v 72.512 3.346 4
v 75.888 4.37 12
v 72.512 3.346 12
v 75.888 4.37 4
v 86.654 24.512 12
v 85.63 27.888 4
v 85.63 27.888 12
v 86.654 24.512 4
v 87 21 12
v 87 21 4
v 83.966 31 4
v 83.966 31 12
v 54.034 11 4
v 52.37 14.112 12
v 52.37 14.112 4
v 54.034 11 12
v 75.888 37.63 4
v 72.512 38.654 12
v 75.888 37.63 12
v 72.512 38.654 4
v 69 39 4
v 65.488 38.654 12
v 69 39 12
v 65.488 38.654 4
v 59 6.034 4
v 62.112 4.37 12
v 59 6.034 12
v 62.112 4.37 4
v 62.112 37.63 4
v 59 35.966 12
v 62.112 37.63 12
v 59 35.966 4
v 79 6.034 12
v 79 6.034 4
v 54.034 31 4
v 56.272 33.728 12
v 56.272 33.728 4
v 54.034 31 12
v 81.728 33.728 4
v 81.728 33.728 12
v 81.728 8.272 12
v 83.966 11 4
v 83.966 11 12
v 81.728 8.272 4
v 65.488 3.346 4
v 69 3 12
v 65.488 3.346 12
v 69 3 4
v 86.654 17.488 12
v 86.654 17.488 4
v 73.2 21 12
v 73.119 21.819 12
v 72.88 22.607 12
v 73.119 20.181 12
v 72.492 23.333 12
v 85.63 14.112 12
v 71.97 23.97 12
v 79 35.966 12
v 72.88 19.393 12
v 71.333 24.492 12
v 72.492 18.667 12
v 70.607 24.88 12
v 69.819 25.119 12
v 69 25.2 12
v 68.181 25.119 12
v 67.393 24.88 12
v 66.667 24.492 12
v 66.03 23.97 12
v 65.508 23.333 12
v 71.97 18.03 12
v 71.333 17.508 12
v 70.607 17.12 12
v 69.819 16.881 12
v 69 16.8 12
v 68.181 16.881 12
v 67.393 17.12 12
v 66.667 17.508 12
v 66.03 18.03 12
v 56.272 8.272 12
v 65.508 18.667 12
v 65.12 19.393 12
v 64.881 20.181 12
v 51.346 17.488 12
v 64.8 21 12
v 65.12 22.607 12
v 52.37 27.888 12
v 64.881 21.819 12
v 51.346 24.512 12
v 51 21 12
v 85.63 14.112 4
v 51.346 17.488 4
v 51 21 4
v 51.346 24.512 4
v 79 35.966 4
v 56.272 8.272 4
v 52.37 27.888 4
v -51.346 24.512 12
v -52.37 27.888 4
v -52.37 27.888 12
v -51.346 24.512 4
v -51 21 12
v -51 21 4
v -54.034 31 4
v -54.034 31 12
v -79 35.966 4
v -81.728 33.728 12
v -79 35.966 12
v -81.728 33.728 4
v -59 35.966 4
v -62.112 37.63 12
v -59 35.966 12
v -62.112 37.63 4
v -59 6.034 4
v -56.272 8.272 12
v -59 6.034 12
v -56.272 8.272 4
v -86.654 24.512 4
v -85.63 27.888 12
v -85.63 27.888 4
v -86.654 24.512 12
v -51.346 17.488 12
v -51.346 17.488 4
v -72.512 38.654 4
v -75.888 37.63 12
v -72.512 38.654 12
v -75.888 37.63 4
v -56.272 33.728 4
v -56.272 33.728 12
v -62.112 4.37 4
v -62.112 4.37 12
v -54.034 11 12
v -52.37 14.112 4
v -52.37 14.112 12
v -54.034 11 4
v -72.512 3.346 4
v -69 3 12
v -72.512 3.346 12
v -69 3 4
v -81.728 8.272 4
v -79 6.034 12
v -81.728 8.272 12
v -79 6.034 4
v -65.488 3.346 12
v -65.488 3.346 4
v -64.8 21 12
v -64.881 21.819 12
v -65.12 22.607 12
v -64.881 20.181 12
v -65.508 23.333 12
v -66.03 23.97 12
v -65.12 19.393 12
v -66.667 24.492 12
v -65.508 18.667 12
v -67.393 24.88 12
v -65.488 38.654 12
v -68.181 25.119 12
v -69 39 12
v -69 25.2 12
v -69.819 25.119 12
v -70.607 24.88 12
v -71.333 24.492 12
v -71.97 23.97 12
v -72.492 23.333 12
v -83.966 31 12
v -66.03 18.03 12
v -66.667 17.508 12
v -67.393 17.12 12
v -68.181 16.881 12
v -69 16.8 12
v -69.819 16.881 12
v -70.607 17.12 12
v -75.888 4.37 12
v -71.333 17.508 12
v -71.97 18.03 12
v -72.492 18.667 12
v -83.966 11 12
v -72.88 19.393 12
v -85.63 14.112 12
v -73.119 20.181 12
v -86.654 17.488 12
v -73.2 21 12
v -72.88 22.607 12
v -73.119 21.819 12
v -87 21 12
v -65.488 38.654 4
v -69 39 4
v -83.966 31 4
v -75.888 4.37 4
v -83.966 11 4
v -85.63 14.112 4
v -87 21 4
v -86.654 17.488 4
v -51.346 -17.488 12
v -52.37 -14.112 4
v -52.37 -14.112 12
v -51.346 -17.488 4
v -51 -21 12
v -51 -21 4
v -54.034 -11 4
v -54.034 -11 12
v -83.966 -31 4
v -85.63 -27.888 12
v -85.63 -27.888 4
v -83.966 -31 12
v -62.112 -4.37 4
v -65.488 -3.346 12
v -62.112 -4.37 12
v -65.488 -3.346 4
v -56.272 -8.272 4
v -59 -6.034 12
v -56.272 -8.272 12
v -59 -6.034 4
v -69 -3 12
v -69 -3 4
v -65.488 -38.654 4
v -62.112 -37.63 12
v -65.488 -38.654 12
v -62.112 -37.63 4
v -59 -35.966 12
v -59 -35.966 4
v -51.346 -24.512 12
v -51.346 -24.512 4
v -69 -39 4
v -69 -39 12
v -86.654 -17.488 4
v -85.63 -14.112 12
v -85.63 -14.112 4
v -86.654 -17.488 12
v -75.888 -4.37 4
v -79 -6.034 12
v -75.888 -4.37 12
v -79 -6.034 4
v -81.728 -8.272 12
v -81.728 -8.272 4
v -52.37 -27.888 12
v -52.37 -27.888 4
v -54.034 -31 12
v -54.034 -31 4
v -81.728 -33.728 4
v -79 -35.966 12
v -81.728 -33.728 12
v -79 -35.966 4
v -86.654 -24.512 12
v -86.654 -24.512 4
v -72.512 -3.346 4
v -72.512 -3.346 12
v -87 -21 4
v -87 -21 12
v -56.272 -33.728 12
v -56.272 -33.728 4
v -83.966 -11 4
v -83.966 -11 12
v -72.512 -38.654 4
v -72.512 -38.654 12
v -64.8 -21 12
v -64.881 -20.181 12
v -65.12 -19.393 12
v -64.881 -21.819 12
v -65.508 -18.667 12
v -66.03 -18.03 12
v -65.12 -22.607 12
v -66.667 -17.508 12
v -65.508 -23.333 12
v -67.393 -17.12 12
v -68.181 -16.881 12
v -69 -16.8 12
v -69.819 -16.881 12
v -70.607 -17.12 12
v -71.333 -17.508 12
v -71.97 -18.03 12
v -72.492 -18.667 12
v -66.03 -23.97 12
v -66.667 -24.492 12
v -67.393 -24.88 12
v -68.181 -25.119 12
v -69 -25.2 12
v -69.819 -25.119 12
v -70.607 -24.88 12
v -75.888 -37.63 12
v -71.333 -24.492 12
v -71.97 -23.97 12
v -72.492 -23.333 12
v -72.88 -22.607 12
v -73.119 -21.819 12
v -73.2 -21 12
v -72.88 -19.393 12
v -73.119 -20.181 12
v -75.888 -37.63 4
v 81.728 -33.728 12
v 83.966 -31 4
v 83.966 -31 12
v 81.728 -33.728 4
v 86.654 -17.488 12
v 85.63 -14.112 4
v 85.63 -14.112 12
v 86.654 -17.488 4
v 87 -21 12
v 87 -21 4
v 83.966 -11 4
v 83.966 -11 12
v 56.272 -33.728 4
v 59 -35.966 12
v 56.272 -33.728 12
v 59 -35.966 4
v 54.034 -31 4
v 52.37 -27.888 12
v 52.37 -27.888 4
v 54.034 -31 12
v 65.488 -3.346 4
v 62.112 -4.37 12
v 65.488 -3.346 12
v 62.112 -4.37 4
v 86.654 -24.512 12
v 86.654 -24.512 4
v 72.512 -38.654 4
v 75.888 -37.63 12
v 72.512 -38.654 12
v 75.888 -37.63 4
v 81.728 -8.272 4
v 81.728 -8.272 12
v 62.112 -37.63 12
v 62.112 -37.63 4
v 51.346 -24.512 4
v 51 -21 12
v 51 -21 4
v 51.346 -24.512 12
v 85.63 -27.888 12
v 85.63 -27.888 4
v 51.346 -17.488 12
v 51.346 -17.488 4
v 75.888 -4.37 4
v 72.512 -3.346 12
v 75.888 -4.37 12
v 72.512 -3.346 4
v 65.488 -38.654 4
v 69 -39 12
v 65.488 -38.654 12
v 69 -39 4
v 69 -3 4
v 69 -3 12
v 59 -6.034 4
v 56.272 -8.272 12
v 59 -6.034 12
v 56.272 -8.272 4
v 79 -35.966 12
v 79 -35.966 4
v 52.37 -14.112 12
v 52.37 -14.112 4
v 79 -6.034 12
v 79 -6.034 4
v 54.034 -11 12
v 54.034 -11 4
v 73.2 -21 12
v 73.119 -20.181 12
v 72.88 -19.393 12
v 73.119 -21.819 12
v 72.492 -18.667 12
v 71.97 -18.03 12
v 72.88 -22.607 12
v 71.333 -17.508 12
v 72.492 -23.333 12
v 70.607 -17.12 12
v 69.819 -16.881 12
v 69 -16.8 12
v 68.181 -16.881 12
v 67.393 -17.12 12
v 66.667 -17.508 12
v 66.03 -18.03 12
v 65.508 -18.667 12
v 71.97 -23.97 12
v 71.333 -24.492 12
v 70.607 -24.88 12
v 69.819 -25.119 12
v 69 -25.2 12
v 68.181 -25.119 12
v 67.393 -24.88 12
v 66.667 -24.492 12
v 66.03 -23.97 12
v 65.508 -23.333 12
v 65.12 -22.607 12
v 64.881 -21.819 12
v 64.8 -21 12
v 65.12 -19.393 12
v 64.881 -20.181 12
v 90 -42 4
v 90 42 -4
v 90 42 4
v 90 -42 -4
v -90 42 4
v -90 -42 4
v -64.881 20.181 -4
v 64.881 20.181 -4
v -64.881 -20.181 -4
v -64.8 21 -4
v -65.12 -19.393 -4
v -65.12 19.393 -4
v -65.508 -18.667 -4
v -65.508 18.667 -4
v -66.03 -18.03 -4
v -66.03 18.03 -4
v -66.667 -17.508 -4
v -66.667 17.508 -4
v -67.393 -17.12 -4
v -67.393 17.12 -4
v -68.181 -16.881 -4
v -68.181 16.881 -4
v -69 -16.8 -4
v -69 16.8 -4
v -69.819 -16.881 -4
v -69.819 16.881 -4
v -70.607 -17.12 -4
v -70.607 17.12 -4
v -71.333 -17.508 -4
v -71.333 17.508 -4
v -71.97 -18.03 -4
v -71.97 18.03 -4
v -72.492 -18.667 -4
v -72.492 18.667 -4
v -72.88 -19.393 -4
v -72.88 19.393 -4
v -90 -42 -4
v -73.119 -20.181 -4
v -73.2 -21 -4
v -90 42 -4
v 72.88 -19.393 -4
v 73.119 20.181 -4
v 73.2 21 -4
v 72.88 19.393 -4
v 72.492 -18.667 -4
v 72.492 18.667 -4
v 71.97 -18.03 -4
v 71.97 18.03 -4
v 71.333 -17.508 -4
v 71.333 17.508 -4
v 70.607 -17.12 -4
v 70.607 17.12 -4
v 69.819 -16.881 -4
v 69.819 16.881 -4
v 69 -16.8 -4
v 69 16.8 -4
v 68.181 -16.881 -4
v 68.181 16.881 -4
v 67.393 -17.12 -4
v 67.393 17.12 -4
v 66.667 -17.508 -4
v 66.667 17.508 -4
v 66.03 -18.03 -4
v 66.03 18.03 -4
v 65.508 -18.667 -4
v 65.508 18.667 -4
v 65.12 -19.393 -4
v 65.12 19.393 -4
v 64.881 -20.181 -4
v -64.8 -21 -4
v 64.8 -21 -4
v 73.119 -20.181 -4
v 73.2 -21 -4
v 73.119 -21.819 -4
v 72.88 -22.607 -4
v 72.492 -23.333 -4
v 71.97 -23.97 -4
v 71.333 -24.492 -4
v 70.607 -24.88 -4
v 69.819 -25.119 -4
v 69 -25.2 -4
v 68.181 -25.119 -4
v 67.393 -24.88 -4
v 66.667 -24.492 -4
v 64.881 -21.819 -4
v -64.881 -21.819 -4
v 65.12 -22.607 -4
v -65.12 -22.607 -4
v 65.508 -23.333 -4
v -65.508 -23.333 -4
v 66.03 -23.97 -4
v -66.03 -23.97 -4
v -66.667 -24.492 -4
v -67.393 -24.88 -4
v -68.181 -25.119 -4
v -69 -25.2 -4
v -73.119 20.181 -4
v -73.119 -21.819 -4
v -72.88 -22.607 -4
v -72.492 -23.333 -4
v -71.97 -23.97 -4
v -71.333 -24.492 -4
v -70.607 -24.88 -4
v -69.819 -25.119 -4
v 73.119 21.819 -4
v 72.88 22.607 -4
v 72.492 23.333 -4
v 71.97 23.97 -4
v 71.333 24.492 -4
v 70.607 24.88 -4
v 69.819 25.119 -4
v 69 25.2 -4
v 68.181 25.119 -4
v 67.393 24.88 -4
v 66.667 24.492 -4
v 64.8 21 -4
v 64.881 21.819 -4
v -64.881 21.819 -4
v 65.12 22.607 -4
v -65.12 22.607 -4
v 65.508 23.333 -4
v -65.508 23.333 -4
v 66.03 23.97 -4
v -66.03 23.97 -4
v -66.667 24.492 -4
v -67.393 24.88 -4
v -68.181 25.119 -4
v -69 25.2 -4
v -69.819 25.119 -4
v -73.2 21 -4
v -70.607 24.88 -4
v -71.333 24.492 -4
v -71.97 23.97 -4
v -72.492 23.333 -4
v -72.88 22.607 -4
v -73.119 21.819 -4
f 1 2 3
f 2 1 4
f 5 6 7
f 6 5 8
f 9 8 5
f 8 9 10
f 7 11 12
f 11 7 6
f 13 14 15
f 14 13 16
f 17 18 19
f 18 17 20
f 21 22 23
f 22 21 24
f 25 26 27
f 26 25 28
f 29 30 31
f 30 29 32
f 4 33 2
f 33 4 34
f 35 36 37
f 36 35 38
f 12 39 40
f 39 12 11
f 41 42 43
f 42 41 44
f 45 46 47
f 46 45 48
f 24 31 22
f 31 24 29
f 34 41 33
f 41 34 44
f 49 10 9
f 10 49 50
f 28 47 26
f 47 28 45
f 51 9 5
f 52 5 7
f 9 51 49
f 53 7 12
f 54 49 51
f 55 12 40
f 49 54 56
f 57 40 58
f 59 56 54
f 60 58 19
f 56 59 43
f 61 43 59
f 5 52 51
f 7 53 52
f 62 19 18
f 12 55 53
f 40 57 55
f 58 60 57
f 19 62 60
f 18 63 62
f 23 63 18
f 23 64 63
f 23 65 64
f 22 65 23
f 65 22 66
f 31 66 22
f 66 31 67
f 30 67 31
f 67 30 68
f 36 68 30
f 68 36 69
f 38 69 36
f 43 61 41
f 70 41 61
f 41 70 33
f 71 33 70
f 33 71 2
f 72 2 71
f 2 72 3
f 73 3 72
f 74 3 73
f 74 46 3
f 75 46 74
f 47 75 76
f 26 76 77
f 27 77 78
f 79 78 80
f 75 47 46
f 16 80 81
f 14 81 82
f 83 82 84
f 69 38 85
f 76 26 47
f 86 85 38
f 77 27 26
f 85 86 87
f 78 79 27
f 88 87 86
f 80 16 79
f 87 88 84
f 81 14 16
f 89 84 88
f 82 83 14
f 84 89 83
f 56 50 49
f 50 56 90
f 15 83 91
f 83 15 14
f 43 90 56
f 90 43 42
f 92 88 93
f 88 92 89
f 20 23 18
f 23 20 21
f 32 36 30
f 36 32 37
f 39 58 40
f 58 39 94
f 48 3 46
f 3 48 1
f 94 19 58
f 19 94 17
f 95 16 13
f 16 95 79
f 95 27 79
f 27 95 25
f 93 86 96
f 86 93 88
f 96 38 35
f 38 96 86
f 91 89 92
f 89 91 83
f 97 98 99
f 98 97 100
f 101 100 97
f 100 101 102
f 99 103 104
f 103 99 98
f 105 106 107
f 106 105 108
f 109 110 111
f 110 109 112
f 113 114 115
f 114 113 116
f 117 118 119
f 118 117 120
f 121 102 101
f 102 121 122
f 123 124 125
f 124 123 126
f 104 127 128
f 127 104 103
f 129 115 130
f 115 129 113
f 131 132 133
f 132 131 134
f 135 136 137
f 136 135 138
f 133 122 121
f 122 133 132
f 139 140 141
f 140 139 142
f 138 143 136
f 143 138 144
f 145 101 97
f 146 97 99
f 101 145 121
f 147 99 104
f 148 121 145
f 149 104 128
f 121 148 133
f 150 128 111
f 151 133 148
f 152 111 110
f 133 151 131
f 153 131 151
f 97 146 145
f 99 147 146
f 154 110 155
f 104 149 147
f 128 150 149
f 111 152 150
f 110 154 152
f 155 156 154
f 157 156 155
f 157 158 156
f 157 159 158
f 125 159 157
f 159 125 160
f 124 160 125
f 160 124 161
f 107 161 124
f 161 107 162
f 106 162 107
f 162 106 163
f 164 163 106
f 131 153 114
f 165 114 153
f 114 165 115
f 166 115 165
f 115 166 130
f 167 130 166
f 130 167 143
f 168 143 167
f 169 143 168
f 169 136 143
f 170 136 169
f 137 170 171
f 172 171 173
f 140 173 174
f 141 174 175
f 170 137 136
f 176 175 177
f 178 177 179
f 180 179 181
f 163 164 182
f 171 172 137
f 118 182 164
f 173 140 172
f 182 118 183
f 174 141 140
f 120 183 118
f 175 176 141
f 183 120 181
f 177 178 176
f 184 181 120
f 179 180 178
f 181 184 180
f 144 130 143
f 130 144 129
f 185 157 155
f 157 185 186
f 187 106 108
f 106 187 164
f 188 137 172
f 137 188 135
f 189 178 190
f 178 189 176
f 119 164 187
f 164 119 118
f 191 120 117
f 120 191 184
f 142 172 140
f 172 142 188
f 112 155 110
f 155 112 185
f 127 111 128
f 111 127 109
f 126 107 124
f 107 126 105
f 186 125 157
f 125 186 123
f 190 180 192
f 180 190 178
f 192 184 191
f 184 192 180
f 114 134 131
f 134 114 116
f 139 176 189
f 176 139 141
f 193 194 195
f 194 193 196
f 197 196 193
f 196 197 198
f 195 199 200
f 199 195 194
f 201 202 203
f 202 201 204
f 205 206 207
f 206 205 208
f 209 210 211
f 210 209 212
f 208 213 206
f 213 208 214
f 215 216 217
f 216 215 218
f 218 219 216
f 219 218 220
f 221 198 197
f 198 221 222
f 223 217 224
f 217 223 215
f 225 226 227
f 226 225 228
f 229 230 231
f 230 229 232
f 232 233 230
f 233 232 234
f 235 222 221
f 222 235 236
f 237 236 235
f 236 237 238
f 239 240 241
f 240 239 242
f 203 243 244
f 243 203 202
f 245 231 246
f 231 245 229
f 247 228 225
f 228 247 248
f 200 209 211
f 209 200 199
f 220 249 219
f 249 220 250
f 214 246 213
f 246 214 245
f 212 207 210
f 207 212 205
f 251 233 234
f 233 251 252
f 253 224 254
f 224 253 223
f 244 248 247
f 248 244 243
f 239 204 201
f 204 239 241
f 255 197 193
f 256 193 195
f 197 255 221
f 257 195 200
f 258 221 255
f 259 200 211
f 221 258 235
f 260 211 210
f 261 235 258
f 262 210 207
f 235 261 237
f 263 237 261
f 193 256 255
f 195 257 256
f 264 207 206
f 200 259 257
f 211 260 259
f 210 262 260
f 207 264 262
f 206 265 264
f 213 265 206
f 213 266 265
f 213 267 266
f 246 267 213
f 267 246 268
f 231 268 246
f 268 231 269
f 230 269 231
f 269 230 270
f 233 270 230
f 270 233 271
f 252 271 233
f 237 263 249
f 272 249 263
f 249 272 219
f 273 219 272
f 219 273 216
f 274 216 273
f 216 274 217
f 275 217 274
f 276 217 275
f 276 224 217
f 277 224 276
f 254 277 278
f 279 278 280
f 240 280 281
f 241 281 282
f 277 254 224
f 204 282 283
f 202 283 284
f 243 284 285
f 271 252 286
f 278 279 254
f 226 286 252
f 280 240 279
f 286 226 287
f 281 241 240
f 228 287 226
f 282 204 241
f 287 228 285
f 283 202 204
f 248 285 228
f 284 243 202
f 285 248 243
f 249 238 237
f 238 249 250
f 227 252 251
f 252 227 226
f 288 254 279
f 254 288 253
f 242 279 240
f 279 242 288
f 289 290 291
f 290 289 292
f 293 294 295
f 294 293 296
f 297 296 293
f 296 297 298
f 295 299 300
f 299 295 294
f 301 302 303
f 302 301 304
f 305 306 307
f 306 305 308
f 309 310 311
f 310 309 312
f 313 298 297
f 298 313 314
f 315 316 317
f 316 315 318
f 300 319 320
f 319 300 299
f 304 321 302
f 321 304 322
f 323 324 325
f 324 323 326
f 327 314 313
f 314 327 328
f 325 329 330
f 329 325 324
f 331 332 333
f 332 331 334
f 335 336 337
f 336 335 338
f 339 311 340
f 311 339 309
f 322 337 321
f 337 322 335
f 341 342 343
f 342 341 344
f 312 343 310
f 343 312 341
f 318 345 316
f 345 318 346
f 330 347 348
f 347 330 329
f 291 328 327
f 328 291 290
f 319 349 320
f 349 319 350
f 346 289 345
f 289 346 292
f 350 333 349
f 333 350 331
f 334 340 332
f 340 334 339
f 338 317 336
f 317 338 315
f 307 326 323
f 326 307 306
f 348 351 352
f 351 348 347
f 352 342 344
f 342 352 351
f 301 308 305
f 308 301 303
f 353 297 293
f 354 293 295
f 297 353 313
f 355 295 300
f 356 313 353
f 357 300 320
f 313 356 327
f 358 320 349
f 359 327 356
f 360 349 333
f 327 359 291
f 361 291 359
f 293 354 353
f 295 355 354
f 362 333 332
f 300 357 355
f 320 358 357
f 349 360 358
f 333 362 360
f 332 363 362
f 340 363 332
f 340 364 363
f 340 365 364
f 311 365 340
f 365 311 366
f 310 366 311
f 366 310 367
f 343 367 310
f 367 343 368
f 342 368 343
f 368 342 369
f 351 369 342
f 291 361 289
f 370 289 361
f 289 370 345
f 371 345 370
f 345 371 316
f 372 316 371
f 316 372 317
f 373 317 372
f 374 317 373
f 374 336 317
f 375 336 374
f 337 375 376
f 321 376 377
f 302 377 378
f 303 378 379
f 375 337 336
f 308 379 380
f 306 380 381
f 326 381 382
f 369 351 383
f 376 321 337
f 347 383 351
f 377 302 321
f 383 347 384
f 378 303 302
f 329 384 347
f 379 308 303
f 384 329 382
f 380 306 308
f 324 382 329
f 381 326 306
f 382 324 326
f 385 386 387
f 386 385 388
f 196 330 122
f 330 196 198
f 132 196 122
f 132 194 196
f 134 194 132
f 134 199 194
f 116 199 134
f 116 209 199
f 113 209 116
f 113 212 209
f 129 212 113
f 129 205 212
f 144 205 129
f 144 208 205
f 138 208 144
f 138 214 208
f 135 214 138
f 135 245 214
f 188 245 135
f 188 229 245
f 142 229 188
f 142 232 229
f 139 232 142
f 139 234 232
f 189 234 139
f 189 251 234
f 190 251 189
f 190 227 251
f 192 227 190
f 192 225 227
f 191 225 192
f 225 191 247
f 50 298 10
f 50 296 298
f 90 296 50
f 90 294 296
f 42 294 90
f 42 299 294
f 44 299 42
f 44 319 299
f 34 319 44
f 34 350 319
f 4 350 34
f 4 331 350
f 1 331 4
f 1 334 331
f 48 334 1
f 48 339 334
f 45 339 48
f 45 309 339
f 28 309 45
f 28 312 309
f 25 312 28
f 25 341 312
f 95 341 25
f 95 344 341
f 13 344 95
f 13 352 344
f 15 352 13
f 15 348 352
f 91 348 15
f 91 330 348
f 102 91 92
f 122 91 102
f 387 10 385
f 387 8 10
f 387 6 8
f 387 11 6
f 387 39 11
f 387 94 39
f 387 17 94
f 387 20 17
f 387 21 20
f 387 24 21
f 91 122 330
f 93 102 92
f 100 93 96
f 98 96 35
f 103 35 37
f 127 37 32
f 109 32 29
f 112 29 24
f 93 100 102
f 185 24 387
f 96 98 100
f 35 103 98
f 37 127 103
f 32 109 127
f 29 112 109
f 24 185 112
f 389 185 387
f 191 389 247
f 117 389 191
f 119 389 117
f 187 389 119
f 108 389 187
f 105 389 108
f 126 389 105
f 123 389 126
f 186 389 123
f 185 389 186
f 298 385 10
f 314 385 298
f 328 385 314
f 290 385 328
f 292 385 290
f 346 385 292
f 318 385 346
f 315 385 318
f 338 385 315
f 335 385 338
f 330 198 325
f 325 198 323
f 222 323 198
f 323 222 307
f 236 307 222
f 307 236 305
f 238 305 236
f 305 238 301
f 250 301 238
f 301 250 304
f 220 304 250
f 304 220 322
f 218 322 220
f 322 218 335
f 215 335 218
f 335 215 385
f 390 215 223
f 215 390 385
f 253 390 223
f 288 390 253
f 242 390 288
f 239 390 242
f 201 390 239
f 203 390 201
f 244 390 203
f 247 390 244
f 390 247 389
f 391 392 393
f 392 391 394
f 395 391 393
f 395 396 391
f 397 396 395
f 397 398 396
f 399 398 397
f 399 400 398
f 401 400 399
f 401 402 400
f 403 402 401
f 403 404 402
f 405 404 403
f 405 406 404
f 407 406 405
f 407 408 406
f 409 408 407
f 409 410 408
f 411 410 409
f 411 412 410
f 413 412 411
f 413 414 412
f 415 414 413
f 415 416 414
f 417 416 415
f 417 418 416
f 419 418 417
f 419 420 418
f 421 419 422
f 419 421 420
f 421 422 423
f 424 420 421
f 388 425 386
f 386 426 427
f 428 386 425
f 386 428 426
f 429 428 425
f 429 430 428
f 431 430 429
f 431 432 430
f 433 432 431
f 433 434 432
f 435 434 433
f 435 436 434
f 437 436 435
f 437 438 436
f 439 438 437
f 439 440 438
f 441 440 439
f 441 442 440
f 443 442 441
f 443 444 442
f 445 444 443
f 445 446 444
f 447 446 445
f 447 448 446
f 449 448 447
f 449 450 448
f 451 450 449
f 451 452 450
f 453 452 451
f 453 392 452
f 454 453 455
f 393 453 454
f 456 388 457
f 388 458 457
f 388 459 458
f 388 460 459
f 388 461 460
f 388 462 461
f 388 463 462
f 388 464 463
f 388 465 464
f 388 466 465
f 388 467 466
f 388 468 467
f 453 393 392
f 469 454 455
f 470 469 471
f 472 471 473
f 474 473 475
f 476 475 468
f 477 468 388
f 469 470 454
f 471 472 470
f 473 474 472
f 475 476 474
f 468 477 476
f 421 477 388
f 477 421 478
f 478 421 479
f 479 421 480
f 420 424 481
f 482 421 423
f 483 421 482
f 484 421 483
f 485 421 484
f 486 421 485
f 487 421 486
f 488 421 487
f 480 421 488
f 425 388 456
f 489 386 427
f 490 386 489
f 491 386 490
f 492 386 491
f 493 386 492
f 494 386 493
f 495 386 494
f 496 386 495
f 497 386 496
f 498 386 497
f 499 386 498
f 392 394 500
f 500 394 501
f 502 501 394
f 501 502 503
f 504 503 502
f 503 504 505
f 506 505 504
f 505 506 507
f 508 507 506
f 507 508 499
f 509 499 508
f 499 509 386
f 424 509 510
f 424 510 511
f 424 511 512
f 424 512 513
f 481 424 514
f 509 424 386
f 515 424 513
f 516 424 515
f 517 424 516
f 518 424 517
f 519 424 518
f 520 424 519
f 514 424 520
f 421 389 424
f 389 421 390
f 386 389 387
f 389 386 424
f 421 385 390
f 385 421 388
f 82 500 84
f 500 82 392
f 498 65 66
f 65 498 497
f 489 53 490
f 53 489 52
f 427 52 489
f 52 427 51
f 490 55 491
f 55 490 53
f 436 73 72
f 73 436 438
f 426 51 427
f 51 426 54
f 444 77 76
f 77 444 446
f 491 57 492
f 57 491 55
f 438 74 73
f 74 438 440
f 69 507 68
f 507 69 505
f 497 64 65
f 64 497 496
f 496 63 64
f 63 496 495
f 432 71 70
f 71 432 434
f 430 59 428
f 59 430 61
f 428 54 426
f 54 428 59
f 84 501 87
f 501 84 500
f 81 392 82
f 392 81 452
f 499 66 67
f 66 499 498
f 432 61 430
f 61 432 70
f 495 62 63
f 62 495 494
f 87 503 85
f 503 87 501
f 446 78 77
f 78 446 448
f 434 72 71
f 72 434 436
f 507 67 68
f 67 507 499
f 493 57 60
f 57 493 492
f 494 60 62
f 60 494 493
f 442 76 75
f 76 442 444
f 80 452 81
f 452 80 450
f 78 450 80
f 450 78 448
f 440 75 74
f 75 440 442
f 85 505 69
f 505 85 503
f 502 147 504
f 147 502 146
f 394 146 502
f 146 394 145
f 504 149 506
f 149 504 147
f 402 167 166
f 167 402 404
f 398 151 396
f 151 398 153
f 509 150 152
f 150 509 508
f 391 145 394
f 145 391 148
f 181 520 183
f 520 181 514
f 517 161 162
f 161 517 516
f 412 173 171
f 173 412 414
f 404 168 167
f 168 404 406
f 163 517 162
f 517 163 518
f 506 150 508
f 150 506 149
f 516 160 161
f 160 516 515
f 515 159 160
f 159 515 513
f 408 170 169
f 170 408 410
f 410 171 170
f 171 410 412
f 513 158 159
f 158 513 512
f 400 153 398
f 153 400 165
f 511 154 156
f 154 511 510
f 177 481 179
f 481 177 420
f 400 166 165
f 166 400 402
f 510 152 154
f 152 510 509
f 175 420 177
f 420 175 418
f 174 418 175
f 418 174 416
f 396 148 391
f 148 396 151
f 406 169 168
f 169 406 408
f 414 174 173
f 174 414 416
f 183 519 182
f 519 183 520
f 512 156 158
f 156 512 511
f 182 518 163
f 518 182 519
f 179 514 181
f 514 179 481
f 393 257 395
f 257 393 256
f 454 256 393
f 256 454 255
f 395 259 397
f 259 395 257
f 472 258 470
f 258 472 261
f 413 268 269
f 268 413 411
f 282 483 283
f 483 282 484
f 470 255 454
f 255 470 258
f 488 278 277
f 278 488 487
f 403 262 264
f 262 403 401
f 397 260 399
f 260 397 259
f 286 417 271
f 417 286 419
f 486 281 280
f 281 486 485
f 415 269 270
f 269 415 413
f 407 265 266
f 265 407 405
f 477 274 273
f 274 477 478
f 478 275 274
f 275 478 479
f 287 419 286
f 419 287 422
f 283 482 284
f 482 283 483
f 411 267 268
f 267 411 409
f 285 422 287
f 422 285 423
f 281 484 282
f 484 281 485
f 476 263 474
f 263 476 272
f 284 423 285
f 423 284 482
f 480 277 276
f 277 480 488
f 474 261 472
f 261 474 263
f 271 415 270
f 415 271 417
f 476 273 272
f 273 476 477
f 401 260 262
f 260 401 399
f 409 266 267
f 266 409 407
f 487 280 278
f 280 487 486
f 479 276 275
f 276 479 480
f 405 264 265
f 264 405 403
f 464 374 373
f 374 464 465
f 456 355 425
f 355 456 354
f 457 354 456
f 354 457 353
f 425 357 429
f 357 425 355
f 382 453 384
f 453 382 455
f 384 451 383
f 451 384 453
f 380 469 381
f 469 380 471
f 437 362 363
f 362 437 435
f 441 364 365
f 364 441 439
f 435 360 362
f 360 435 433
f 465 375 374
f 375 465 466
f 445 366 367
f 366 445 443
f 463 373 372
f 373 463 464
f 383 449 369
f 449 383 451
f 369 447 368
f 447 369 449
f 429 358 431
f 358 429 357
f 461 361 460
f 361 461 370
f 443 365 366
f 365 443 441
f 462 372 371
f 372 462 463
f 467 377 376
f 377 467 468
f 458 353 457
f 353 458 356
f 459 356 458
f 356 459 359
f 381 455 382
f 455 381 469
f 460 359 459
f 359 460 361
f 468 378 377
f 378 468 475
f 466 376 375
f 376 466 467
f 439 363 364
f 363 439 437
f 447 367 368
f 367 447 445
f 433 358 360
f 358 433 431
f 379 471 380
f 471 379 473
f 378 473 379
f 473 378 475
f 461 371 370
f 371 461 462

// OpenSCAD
$fn = 32;

// ----------------------------------------------------------------------
// Anchor pads 180 x 84 x 16
// four corner bosses with anchor holes
// ----------------------------------------------------------------------

// --- parameters (mm) ---
plate = [180, 84, 8];  // base plate size (x, y, z)
pads = 4;              // boss count, one per corner
edge = 21;             // boss centre offset from the plate edge
boss_d = 36;           // boss diameter
boss_h = 8;            // boss height above the base plate
hole_d = 8.4;          // hole diameter

// --- derived feature positions (mm) ---
height = plate[2] + boss_h;      // = 16   overall height of the part
corner_x = plate[0] / 2 - edge;  // = 69   boss centre X
corner_y = plate[1] / 2 - edge;  // = 21   boss centre Y
feature_centers = [
  [corner_x, corner_y],
  [-corner_x, corner_y],
  [-corner_x, -corner_y],
  [corner_x, -corner_y]
];   // boss centres, anchor holes are drilled there

// base plate, four bosses standing on it, anchor holes all the way through
difference() {
  union() {
    cube(plate, center = true);
    for (centre = feature_centers)
      translate([centre[0], centre[1], plate[2] / 2 - 1])
        cylinder(d = boss_d, h = boss_h + 1);
  }
  for (centre = feature_centers)
    translate([centre[0], centre[1], -height])
      cylinder(d = hole_d, h = 2 * height + 2);  // through boss and plate
}
